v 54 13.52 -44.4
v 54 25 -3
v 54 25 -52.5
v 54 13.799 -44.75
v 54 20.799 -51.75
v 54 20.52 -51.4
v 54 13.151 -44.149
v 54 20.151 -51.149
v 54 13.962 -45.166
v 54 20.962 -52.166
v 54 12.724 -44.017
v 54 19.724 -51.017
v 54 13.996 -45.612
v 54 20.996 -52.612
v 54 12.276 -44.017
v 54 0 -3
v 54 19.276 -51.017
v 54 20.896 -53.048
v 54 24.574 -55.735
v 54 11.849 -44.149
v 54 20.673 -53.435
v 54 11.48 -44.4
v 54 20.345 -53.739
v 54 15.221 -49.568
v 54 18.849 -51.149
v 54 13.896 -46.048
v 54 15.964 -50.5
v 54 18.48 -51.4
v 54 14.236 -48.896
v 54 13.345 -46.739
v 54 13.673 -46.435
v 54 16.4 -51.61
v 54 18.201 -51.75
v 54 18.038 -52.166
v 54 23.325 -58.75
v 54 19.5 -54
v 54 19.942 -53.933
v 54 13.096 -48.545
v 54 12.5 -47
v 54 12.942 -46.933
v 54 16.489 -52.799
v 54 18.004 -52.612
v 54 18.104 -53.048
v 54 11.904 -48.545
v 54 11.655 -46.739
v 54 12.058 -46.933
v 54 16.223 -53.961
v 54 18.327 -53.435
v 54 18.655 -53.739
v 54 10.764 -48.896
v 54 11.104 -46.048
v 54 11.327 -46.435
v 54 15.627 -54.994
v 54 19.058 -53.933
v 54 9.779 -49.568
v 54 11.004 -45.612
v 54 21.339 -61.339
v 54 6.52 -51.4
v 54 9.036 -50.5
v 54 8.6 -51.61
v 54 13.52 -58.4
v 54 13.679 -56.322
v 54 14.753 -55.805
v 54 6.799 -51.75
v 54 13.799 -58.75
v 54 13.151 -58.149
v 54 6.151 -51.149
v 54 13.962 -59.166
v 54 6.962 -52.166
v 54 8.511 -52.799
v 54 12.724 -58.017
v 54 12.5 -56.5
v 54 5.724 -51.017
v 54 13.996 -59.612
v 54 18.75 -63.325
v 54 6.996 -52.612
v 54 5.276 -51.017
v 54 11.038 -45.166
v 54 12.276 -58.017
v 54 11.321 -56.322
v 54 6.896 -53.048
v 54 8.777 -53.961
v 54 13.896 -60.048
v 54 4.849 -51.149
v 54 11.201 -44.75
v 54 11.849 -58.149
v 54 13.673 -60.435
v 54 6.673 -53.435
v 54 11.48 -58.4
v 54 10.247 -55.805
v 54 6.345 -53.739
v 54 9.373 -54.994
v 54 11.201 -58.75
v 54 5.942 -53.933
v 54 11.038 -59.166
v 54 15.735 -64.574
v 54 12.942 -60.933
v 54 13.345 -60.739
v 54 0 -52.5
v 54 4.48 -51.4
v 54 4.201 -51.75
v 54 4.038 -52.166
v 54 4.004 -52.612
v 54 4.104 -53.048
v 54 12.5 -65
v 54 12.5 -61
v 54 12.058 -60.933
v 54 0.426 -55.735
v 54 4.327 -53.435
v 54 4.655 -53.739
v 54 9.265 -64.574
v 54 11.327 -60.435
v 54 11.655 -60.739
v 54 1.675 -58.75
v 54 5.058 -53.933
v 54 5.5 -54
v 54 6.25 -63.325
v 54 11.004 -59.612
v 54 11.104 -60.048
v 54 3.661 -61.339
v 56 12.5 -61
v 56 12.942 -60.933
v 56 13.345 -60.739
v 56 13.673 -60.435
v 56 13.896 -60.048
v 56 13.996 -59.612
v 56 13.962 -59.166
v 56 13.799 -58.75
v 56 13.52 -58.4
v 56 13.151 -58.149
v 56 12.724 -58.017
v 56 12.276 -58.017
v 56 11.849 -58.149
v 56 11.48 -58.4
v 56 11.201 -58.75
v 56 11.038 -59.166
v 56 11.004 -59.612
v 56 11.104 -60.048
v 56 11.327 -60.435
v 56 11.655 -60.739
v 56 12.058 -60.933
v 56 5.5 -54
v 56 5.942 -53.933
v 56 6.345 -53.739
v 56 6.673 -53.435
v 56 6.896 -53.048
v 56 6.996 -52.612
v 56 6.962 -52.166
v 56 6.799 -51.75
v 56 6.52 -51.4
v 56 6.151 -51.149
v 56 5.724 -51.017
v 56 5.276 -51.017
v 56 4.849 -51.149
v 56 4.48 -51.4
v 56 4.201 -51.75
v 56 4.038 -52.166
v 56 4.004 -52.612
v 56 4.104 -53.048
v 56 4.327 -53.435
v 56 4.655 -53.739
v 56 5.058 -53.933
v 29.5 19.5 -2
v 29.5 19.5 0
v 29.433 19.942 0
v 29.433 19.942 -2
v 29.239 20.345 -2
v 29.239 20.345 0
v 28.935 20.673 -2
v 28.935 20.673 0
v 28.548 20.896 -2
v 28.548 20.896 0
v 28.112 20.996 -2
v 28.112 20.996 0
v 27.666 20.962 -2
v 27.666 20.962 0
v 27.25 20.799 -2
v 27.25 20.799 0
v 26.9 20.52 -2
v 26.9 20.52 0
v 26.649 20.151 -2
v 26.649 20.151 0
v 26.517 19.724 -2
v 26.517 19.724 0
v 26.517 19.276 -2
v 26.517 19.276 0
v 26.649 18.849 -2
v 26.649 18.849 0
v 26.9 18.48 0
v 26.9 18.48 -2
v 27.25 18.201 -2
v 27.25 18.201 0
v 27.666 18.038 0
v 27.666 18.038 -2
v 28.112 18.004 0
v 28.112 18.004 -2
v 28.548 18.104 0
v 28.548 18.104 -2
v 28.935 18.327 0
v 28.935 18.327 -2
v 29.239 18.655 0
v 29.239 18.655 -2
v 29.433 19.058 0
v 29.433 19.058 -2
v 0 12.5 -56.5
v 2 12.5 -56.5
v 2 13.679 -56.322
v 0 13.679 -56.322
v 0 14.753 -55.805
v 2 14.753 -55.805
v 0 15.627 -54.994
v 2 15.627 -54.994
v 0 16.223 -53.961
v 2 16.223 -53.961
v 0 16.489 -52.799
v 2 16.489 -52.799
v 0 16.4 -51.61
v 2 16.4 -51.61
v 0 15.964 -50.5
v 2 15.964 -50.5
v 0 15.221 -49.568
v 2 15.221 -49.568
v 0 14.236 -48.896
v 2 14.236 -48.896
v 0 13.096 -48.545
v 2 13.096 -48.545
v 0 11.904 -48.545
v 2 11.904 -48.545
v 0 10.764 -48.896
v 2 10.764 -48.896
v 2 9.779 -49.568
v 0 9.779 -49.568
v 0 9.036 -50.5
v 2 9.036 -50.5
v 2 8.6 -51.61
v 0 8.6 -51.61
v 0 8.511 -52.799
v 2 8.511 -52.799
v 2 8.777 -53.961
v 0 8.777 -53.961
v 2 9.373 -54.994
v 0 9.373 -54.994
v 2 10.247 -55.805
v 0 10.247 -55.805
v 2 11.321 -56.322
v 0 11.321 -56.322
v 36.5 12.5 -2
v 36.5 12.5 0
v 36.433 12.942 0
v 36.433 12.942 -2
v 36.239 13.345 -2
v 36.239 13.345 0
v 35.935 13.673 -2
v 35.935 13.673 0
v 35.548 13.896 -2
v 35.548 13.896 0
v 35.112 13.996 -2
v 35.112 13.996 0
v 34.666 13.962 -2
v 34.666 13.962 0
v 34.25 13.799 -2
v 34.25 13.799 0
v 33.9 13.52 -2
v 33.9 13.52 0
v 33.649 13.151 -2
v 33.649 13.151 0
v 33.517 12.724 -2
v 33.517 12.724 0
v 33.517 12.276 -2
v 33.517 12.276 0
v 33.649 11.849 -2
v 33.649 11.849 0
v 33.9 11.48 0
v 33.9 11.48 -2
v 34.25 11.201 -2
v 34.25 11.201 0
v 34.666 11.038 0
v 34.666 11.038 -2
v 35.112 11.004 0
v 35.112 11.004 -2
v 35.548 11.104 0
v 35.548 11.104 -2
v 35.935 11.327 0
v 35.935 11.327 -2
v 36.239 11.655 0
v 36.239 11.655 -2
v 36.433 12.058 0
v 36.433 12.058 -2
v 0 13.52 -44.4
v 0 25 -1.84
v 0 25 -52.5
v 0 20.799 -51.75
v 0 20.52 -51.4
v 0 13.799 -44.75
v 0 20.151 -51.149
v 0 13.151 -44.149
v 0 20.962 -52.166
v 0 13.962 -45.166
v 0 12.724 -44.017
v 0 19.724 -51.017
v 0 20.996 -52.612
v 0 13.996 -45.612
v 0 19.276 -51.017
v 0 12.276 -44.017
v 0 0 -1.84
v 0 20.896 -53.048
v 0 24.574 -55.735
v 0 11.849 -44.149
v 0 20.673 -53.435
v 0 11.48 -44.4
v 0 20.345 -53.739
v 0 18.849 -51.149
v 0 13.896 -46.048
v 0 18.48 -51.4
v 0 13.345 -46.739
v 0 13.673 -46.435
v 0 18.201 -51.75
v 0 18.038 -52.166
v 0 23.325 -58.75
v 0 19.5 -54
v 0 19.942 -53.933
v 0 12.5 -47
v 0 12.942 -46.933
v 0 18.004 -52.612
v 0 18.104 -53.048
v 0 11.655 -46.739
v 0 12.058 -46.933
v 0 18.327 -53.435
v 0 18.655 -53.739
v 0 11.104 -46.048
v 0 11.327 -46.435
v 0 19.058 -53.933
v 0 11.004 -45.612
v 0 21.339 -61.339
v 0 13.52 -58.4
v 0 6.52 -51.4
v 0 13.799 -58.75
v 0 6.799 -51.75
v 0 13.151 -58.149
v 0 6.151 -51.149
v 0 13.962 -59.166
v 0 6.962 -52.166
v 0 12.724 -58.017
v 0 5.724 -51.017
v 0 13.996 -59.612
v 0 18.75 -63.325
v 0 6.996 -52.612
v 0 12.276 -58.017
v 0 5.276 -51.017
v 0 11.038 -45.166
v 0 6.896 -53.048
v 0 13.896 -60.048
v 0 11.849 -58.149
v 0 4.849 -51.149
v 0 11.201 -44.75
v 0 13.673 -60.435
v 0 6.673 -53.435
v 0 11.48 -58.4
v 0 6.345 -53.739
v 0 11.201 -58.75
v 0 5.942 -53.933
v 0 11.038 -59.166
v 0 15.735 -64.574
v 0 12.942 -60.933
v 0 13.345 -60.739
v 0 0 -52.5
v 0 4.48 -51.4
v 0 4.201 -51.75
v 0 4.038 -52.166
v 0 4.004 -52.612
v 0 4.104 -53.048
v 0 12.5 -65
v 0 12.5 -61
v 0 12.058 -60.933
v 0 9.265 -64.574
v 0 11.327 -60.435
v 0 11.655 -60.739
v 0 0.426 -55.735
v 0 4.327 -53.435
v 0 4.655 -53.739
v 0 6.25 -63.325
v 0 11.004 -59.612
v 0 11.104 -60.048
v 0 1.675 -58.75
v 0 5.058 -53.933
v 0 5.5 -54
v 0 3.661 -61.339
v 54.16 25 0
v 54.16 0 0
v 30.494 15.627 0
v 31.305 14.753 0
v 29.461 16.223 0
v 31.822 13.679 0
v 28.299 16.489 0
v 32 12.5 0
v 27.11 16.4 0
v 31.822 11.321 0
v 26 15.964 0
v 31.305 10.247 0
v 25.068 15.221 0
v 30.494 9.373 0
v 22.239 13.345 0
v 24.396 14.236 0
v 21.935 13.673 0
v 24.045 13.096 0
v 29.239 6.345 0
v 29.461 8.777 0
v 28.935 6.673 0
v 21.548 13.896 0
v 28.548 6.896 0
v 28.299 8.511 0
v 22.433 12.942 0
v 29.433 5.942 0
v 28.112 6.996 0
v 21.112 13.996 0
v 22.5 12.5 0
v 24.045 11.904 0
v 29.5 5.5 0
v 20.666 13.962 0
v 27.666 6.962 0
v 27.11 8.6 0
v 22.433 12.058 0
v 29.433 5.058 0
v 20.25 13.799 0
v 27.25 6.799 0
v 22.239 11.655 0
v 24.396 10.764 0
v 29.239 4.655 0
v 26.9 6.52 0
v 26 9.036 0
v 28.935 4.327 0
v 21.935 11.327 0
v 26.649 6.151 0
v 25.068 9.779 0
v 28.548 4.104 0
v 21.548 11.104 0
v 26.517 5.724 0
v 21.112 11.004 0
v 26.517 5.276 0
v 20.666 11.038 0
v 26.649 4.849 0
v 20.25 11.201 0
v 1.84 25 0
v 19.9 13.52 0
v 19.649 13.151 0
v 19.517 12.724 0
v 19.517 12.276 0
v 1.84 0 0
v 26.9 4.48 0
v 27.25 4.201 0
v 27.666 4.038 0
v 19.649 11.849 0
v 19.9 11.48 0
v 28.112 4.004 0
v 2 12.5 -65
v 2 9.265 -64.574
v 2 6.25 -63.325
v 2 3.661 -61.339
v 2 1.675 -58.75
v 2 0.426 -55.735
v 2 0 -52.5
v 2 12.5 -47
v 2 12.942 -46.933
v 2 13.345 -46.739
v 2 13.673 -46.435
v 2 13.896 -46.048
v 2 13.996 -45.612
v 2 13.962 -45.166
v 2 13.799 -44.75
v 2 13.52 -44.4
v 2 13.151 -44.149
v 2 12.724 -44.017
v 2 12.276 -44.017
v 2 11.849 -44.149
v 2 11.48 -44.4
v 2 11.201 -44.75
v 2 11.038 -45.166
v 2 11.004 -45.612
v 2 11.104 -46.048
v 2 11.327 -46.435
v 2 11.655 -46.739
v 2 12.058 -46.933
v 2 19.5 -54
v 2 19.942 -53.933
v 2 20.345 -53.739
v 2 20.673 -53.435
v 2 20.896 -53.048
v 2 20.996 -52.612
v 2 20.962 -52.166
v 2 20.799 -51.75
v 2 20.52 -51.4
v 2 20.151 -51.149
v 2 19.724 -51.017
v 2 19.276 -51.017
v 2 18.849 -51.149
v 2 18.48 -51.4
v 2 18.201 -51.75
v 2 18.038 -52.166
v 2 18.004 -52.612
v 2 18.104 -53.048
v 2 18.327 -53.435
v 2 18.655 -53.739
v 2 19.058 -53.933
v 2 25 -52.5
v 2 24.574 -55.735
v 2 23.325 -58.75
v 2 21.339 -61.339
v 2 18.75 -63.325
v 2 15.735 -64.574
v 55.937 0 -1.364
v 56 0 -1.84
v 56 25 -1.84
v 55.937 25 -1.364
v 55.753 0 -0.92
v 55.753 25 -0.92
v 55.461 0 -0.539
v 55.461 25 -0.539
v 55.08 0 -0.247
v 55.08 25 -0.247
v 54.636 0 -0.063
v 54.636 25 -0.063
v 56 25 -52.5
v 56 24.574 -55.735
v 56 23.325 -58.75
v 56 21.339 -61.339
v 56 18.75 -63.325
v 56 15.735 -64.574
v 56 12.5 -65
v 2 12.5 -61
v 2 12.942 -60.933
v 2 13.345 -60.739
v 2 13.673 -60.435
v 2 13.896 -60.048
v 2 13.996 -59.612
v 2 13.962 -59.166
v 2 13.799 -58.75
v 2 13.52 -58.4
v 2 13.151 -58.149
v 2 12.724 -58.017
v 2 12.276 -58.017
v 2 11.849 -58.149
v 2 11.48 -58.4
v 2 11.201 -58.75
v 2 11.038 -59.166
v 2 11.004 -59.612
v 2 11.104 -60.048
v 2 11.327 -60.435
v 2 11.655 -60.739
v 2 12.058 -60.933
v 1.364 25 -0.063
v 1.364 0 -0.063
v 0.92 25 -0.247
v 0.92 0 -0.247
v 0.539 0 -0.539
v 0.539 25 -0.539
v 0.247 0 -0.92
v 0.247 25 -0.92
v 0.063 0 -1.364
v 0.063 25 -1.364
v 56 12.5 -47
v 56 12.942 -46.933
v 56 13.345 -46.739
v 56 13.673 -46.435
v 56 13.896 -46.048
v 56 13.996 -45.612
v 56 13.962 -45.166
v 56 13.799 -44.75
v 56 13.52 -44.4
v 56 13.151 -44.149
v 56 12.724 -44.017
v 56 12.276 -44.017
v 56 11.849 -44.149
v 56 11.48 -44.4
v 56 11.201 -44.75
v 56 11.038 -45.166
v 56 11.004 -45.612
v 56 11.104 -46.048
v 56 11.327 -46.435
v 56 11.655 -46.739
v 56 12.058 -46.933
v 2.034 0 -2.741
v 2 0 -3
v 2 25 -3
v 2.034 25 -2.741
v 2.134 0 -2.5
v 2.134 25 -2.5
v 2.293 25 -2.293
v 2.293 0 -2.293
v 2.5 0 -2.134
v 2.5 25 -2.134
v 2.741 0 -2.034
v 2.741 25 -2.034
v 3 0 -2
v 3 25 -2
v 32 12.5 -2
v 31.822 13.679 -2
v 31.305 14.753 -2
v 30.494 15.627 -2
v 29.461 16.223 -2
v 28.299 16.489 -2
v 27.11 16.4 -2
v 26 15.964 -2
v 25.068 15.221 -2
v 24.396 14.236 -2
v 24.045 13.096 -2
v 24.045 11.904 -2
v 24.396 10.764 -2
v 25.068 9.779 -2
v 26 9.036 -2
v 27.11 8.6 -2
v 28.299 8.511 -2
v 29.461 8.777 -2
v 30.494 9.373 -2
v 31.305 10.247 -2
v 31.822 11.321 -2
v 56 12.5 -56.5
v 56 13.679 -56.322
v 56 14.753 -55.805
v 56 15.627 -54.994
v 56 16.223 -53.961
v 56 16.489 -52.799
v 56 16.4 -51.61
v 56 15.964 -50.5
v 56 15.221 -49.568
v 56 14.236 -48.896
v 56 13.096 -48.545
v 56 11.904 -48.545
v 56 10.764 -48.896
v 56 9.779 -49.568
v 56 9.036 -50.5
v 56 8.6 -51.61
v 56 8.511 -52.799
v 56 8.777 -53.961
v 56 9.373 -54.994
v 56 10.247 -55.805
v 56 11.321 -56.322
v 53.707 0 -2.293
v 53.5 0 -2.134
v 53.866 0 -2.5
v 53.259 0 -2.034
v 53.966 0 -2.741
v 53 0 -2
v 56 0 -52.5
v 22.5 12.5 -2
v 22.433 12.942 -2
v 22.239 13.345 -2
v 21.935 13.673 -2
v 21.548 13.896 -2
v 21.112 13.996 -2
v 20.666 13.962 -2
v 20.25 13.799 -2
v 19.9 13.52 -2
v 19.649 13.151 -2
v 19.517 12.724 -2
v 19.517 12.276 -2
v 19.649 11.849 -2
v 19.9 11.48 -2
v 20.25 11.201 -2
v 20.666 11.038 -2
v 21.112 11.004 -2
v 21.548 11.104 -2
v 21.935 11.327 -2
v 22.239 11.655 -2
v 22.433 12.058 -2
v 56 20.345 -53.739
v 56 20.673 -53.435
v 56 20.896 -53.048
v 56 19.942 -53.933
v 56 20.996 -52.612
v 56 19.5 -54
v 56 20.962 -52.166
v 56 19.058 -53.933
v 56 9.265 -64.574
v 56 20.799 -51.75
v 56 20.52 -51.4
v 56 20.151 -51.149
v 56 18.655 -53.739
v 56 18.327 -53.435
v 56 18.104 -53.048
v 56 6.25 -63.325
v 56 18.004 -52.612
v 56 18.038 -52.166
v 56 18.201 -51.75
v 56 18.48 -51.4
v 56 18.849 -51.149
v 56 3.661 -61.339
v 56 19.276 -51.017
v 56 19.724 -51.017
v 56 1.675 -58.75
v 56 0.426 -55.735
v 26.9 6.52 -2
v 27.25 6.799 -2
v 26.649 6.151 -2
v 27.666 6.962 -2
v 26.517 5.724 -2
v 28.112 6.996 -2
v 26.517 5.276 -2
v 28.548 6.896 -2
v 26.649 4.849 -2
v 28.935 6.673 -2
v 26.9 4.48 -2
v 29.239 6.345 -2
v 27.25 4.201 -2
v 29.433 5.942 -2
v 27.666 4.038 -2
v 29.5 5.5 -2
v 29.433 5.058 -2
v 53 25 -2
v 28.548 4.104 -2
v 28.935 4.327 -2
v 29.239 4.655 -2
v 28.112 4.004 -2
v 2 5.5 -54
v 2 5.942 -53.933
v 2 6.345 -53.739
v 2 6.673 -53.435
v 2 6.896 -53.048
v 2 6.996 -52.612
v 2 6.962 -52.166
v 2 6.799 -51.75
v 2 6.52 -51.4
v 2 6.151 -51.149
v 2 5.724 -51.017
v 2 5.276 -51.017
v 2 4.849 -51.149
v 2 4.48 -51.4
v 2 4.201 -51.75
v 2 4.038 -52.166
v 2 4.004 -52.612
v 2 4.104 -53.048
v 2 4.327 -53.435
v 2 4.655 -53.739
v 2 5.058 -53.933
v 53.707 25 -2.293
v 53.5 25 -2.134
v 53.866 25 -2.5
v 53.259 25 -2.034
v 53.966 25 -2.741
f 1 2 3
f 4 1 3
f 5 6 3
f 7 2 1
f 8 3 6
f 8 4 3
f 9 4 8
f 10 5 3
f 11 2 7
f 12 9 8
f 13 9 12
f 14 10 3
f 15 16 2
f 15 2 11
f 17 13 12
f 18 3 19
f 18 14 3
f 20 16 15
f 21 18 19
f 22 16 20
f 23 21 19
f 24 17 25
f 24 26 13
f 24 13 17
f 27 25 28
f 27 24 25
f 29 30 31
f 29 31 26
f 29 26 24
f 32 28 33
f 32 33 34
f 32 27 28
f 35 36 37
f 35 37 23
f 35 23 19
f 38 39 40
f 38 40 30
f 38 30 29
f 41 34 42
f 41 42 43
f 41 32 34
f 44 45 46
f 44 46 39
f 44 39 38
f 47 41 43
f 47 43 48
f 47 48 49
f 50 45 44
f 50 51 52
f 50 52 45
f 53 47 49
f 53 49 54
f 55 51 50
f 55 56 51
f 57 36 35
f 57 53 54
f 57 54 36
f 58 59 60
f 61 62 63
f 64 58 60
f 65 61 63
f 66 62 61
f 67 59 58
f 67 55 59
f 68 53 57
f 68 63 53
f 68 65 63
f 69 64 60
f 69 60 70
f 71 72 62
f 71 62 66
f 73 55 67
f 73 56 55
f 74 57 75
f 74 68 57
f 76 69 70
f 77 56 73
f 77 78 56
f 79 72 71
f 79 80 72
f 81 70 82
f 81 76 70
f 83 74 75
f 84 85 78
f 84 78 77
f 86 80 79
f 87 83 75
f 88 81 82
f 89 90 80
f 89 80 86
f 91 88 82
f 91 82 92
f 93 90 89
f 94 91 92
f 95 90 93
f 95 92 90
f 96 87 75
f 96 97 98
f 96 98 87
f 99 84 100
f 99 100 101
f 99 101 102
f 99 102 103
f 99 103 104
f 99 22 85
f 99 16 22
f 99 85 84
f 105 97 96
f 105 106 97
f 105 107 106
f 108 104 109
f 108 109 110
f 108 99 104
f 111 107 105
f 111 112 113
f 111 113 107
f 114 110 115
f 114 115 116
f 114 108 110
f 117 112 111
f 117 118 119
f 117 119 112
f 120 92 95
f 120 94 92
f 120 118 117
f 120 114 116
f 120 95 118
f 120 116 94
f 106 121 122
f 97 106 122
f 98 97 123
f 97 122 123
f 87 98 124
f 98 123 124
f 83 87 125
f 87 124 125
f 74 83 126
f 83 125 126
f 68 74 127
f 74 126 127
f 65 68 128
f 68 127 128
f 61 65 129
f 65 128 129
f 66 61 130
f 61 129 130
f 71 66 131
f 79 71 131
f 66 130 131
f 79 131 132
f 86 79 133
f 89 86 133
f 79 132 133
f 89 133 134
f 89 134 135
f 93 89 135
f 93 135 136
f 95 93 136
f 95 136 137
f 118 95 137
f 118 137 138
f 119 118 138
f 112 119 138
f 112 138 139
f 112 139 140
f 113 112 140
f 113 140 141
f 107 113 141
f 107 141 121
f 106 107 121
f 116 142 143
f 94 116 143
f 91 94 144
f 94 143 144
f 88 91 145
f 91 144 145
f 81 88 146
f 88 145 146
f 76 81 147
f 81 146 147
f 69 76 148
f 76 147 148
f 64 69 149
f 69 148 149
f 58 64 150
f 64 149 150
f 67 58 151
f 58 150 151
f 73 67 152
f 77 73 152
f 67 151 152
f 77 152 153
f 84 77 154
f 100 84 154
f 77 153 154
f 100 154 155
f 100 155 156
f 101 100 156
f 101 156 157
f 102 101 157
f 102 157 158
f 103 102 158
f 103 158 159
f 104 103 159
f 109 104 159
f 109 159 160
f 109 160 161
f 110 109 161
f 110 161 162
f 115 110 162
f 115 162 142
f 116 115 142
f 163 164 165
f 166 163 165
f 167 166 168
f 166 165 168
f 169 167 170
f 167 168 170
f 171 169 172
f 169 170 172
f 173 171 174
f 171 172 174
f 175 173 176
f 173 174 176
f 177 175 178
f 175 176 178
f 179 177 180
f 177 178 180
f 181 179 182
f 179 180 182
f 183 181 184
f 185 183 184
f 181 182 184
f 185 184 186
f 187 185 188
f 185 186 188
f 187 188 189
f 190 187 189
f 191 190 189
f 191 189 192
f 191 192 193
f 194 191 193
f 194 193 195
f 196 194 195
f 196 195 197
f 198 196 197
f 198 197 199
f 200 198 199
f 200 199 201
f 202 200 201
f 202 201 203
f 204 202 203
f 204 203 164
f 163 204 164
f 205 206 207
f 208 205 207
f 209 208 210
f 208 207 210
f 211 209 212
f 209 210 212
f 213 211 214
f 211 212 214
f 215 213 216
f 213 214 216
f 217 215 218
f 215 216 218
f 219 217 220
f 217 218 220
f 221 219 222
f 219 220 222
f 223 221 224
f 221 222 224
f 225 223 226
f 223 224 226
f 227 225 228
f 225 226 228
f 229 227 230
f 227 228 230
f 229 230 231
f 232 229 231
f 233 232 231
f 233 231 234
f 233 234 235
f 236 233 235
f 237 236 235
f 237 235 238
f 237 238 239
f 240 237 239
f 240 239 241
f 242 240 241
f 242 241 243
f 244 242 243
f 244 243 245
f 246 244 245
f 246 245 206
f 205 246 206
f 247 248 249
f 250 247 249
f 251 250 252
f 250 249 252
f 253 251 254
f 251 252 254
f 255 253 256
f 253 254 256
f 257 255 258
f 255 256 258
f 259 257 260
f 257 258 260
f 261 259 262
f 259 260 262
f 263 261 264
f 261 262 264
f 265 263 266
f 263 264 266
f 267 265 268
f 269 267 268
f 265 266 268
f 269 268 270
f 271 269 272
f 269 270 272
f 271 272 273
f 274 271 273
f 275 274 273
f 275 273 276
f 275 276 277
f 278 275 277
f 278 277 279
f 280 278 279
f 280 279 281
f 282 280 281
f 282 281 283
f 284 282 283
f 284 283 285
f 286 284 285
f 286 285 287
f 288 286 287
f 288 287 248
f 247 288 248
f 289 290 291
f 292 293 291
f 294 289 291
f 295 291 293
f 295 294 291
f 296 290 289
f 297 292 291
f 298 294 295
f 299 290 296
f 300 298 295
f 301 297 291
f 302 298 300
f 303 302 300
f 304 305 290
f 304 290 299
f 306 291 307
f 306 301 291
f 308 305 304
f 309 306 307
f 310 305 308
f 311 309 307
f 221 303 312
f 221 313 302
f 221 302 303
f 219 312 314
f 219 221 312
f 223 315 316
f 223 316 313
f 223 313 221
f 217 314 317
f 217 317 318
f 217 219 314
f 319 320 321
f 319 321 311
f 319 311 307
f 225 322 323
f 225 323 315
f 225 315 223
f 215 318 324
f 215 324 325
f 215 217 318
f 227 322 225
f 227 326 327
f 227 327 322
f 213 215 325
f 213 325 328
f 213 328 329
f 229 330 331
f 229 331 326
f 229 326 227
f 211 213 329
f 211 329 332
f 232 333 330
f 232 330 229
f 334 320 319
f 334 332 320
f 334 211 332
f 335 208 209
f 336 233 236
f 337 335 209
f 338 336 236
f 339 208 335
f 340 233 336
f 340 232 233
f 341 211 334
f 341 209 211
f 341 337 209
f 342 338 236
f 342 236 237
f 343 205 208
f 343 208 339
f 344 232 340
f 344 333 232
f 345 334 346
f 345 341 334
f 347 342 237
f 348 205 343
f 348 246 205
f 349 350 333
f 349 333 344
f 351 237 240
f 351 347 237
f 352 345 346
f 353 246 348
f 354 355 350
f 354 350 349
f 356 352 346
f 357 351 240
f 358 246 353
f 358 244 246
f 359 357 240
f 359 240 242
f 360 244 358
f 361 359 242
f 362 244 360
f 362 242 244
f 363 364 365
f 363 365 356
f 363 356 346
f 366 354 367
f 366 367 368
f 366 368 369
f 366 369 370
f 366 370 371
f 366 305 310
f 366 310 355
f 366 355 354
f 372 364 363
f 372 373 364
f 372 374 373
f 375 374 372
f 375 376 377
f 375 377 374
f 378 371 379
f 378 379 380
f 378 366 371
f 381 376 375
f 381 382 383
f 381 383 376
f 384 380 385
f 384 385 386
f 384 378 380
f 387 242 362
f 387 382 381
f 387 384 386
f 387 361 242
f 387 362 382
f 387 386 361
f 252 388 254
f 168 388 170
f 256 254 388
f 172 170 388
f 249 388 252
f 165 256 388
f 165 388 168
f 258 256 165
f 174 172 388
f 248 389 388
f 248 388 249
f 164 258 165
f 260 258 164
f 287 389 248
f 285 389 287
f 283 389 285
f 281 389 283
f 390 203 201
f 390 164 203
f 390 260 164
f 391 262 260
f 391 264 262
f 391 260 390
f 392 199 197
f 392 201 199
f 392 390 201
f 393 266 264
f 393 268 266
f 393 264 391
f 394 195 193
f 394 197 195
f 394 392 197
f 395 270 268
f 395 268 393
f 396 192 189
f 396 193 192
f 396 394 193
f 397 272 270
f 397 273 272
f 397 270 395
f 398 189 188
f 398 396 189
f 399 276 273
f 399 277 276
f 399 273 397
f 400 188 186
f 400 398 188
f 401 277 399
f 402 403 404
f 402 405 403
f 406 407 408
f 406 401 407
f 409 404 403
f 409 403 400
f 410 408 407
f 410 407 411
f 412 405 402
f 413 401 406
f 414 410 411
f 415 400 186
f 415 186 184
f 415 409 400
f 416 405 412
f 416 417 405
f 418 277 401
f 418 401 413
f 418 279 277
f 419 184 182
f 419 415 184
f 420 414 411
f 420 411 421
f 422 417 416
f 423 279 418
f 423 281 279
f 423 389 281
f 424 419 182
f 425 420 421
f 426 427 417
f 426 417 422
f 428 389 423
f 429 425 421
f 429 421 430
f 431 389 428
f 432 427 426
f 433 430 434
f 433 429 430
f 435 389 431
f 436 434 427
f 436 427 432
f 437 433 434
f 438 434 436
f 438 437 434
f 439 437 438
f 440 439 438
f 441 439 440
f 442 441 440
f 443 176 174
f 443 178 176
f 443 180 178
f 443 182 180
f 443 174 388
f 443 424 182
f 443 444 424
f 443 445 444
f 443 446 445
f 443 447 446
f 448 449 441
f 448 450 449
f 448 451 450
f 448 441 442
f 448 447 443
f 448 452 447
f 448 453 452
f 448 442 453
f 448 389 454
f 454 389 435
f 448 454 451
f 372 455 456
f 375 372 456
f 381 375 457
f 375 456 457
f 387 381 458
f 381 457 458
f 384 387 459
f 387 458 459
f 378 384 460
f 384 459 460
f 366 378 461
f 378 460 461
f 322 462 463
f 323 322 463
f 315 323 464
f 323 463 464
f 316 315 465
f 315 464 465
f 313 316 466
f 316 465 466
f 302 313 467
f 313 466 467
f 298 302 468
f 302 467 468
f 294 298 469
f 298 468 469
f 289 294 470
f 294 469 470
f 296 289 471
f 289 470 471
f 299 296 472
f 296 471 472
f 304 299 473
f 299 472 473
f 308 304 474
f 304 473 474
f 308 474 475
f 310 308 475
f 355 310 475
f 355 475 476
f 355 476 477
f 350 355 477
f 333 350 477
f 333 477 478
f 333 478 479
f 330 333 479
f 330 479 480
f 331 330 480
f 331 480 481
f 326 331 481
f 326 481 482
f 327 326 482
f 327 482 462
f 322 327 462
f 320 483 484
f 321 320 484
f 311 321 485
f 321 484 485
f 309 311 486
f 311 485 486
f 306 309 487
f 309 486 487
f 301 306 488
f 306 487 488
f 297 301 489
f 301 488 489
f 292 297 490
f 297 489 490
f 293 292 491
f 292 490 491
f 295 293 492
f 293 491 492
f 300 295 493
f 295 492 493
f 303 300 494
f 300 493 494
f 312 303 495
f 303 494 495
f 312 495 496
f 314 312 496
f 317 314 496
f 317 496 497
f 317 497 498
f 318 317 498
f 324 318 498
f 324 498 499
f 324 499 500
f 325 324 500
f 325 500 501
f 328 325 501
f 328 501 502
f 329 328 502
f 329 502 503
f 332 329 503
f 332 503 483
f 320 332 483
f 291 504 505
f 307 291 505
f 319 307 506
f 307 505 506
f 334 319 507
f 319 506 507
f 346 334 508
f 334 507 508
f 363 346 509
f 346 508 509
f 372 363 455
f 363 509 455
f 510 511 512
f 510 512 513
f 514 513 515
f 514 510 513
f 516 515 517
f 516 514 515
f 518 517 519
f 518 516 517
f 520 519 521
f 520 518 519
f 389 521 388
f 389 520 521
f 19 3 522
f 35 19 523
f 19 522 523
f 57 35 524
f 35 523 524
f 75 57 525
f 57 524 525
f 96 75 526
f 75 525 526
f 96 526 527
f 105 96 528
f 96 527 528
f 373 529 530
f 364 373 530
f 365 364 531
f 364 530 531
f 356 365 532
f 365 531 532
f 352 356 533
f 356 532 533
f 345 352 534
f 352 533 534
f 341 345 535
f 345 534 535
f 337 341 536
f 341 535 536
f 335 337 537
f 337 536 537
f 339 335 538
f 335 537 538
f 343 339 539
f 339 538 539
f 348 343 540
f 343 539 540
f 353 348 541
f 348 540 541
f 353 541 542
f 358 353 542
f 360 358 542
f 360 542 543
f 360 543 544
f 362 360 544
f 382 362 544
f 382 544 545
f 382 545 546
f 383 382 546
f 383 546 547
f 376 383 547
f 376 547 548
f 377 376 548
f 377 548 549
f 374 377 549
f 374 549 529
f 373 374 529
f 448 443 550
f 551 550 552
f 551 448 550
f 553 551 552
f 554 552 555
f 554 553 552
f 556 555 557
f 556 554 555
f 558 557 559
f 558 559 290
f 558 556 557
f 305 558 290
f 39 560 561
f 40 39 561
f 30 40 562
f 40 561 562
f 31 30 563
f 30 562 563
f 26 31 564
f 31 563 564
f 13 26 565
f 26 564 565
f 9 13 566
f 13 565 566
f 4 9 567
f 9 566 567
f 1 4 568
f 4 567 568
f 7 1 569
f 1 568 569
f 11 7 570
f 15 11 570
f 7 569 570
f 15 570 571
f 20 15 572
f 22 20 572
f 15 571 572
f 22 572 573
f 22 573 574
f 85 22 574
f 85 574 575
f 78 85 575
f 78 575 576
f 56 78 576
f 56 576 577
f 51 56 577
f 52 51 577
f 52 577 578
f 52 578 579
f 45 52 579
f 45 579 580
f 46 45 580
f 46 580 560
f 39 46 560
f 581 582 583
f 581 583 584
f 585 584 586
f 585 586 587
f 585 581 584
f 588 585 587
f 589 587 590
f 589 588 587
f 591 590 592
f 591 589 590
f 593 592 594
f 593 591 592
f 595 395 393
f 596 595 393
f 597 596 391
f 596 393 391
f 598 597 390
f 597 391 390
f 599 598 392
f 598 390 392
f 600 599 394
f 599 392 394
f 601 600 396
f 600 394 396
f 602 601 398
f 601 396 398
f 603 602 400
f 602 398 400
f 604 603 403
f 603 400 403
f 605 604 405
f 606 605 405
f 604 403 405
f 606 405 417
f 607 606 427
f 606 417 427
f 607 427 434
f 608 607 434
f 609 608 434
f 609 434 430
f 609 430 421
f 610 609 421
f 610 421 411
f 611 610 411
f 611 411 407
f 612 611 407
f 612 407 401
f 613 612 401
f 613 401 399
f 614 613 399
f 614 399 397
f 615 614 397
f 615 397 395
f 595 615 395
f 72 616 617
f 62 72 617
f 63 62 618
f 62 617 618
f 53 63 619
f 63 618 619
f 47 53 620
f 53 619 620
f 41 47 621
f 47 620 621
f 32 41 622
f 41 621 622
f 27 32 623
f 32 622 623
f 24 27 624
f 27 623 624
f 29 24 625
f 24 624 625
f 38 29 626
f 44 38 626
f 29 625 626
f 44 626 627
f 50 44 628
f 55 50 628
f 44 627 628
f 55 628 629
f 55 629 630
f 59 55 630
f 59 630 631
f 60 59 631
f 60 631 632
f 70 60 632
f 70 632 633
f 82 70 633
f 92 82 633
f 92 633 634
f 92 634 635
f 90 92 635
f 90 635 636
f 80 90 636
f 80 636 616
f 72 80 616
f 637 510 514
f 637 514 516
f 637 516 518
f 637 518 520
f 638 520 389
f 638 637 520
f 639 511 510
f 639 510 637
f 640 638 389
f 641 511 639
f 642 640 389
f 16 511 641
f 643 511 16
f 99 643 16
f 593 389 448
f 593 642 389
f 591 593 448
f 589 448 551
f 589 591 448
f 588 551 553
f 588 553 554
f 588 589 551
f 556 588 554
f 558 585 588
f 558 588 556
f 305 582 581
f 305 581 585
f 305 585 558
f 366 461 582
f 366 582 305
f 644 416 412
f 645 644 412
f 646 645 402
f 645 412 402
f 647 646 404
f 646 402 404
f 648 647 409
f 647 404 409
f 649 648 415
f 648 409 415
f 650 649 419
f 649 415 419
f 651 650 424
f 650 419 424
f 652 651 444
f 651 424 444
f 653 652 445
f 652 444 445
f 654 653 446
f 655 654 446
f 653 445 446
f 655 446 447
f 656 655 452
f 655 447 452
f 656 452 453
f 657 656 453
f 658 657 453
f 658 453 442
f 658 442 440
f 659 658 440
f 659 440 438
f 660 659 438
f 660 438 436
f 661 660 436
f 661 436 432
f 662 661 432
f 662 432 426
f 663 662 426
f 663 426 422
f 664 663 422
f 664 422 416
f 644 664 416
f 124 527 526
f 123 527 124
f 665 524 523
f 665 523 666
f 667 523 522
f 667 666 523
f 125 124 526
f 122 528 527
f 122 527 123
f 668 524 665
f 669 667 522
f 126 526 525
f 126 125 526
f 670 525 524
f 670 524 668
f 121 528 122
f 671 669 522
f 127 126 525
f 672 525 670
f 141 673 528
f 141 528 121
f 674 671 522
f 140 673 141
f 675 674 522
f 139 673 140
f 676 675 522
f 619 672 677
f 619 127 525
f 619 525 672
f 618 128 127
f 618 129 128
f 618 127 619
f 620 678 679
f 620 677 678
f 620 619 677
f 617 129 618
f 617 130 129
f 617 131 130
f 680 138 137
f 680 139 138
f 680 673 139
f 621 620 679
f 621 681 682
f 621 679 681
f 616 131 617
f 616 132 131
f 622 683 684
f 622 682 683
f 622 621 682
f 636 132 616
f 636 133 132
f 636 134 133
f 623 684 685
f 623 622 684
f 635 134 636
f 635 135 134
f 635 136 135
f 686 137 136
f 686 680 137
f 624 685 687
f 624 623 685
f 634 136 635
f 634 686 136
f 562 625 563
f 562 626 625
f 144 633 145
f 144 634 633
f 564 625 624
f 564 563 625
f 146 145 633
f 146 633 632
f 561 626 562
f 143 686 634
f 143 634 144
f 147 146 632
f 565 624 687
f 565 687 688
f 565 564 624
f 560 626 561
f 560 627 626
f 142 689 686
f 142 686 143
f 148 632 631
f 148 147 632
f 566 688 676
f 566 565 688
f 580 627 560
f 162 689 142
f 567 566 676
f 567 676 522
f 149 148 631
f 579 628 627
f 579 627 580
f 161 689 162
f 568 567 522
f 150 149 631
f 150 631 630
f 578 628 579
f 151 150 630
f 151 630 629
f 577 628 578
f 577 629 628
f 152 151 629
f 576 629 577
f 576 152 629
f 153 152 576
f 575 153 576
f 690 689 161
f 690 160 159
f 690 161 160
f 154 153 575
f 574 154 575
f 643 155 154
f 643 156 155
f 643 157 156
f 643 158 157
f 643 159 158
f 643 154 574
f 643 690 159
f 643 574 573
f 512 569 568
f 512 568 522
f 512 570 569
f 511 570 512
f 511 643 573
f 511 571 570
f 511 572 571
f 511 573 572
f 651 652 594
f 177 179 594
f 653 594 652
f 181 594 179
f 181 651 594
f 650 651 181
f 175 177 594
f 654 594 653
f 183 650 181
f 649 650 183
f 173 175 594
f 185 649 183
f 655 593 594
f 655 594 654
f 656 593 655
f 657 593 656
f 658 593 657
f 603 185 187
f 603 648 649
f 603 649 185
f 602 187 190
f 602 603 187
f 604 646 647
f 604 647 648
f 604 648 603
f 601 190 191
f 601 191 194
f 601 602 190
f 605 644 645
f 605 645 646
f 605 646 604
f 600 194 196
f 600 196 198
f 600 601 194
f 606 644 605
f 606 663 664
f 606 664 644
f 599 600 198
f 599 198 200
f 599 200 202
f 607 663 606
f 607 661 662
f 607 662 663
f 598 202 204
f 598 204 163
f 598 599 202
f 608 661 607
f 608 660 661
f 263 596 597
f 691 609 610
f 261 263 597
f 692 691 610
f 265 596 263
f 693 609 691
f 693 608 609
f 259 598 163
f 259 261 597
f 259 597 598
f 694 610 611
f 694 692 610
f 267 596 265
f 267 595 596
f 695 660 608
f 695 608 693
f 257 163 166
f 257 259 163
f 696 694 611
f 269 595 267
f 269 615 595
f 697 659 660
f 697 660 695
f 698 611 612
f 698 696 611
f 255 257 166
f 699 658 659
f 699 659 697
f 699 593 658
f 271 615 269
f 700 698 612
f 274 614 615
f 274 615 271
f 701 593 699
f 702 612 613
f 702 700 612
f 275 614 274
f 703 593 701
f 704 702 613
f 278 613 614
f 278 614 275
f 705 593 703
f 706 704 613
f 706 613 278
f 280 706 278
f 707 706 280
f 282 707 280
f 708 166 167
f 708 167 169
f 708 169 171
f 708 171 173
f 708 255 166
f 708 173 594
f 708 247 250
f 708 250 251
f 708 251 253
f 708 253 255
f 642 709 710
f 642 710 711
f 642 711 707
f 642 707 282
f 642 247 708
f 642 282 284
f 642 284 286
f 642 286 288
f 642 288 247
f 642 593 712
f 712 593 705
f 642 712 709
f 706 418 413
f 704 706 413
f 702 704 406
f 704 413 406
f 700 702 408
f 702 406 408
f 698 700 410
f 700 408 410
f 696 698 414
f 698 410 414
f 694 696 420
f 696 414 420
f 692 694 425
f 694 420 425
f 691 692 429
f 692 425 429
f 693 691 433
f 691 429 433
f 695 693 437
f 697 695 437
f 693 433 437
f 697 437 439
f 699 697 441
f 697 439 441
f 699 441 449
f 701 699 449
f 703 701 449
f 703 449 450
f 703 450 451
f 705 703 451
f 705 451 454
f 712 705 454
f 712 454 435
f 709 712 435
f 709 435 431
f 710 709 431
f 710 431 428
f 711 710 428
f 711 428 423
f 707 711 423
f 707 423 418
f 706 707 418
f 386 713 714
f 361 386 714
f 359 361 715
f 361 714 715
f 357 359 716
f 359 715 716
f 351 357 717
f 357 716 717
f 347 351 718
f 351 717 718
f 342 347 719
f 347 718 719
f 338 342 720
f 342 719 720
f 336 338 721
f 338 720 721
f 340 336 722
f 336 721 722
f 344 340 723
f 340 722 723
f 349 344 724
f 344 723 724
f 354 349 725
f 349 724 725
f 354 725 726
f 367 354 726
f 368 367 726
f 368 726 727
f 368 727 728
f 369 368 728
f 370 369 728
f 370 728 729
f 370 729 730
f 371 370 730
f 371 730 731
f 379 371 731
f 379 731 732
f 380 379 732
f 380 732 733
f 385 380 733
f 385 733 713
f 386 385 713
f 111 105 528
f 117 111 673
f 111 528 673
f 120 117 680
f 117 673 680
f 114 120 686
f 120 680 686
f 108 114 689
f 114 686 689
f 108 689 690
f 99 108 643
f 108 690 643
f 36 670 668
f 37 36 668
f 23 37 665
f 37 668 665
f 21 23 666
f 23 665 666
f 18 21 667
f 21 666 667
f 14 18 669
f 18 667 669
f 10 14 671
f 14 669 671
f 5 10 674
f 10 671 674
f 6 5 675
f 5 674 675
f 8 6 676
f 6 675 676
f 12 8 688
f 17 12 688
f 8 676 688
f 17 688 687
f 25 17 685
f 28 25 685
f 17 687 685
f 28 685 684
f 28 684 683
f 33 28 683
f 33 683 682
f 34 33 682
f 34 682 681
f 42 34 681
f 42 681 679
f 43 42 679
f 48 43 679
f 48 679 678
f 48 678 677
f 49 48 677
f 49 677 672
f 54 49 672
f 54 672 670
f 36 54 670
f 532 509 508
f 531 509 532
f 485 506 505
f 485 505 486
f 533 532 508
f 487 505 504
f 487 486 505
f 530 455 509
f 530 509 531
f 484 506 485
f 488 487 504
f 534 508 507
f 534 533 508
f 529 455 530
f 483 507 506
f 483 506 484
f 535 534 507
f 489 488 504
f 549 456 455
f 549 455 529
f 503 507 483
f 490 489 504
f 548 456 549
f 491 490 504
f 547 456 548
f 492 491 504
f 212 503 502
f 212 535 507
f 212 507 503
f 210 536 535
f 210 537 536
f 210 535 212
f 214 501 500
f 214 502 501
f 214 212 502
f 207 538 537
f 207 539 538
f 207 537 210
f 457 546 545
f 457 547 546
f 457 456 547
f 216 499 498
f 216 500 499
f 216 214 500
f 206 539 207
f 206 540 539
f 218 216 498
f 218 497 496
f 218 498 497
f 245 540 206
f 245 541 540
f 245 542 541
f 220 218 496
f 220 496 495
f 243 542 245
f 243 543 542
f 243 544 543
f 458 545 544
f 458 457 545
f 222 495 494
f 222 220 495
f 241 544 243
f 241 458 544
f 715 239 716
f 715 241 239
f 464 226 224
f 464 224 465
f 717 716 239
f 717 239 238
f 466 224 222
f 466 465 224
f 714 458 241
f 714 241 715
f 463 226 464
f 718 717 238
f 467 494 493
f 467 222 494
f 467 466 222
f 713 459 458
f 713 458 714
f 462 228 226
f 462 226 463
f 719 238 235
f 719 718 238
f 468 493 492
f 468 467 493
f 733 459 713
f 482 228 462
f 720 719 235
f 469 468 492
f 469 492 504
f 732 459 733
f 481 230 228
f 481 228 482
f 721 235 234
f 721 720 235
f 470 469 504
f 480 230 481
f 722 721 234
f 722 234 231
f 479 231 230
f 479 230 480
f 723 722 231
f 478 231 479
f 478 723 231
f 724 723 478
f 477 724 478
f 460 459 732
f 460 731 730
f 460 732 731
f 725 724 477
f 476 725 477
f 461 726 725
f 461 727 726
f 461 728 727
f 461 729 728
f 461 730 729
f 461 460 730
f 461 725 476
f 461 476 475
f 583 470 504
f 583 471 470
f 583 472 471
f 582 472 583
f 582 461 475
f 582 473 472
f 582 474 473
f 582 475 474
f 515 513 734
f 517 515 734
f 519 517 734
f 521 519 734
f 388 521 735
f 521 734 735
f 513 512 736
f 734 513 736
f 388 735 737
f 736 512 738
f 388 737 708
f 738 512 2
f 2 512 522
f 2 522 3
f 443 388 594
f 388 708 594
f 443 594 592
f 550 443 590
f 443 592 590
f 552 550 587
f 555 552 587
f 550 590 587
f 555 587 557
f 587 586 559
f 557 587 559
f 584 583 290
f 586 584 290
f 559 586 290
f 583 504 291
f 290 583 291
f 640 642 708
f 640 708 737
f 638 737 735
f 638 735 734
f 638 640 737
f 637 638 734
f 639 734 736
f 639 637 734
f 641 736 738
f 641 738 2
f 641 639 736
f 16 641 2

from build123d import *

# Parameters (mm, degrees)
SALIENTE_EXTRUIR2_DEPTH = 25
CROQUIS2_R              = 4
CROQUIS2_R_2            = 1.5
CORTAR_EXTRUIR1_DEPTH   = 10
CROQUIS3_R              = 4
CROQUIS3_R_2            = 1.5
CORTAR_EXTRUIR2_DEPTH   = 60


with BuildPart() as part:
    # Croquis1 → Saliente-Extruir2 (new body)
    with BuildSketch(Plane(origin=(0, 0, 0), x_dir=(1, 0, 0), z_dir=(0, 1, 0))):
        with BuildLine():
            Line((0, 1.84), (0, 65))
            Line((0, 65), (2, 65))
            Line((2, 65), (2, 3))
            ThreePointArc((2, 3), (2.292893219, 2.292893219), (3, 2))
            Line((3, 2), (53, 2))
            ThreePointArc((53, 2), (53.707106781, 2.292893219), (54, 3))
            Line((54, 3), (54, 65))
            Line((54, 65), (56, 65))
            Line((56, 65), (56, 1.84))
            ThreePointArc((56, 1.84), (55.461076477, 0.538923523), (54.16, 0))
            Line((54.16, 0), (1.84, 0))
            ThreePointArc((1.84, 0), (0.538923523, 0.538923523), (0, 1.84))
        make_face()
    extrude(amount=SALIENTE_EXTRUIR2_DEPTH)

    # Croquis2 → Cortar-Extruir1 (cut)
    with BuildSketch(Plane.XY):
        with Locations((28, 12.5)):
            Circle(CROQUIS2_R)
        with Locations((28, 19.5)):
            Circle(CROQUIS2_R_2)
        with Locations((28, 5.5)):
            Circle(CROQUIS2_R_2)
        with Locations((35, 12.5)):
            Circle(CROQUIS2_R_2)
        with Locations((21, 12.5)):
            Circle(CROQUIS2_R_2)
    extrude(amount=-CORTAR_EXTRUIR1_DEPTH, mode=Mode.SUBTRACT)

    # Croquis3 → Cortar-Extruir2 (cut)
    with BuildSketch(Plane(origin=(56, 0, 0), x_dir=(0, 0, -1), z_dir=(1, 0, 0))):
        with BuildLine():
            Line((65, 25), (52.5, 25))
            ThreePointArc((52.5, 25), (61.338834765, 21.338834765), (65, 12.5))
            Line((65, 12.5), (65, 25))
        make_face()
        with BuildLine():
            Line((65, 0), (65, 12.5))
            ThreePointArc((65, 12.5), (61.338834765, 3.661165235), (52.5, 0))
            Line((52.5, 0), (65, 0))
        make_face()
        with Locations((52.5, 12.5)):
            Circle(CROQUIS3_R)
        with Locations((45.5, 12.5)):
            Circle(CROQUIS3_R_2)
        with Locations((52.5, 19.5)):
            Circle(CROQUIS3_R_2)
        with Locations((59.5, 12.5)):
            Circle(CROQUIS3_R_2)
        with Locations((52.5, 5.5)):
            Circle(CROQUIS3_R_2)
    extrude(amount=-CORTAR_EXTRUIR2_DEPTH, mode=Mode.SUBTRACT)


solid = part.part
